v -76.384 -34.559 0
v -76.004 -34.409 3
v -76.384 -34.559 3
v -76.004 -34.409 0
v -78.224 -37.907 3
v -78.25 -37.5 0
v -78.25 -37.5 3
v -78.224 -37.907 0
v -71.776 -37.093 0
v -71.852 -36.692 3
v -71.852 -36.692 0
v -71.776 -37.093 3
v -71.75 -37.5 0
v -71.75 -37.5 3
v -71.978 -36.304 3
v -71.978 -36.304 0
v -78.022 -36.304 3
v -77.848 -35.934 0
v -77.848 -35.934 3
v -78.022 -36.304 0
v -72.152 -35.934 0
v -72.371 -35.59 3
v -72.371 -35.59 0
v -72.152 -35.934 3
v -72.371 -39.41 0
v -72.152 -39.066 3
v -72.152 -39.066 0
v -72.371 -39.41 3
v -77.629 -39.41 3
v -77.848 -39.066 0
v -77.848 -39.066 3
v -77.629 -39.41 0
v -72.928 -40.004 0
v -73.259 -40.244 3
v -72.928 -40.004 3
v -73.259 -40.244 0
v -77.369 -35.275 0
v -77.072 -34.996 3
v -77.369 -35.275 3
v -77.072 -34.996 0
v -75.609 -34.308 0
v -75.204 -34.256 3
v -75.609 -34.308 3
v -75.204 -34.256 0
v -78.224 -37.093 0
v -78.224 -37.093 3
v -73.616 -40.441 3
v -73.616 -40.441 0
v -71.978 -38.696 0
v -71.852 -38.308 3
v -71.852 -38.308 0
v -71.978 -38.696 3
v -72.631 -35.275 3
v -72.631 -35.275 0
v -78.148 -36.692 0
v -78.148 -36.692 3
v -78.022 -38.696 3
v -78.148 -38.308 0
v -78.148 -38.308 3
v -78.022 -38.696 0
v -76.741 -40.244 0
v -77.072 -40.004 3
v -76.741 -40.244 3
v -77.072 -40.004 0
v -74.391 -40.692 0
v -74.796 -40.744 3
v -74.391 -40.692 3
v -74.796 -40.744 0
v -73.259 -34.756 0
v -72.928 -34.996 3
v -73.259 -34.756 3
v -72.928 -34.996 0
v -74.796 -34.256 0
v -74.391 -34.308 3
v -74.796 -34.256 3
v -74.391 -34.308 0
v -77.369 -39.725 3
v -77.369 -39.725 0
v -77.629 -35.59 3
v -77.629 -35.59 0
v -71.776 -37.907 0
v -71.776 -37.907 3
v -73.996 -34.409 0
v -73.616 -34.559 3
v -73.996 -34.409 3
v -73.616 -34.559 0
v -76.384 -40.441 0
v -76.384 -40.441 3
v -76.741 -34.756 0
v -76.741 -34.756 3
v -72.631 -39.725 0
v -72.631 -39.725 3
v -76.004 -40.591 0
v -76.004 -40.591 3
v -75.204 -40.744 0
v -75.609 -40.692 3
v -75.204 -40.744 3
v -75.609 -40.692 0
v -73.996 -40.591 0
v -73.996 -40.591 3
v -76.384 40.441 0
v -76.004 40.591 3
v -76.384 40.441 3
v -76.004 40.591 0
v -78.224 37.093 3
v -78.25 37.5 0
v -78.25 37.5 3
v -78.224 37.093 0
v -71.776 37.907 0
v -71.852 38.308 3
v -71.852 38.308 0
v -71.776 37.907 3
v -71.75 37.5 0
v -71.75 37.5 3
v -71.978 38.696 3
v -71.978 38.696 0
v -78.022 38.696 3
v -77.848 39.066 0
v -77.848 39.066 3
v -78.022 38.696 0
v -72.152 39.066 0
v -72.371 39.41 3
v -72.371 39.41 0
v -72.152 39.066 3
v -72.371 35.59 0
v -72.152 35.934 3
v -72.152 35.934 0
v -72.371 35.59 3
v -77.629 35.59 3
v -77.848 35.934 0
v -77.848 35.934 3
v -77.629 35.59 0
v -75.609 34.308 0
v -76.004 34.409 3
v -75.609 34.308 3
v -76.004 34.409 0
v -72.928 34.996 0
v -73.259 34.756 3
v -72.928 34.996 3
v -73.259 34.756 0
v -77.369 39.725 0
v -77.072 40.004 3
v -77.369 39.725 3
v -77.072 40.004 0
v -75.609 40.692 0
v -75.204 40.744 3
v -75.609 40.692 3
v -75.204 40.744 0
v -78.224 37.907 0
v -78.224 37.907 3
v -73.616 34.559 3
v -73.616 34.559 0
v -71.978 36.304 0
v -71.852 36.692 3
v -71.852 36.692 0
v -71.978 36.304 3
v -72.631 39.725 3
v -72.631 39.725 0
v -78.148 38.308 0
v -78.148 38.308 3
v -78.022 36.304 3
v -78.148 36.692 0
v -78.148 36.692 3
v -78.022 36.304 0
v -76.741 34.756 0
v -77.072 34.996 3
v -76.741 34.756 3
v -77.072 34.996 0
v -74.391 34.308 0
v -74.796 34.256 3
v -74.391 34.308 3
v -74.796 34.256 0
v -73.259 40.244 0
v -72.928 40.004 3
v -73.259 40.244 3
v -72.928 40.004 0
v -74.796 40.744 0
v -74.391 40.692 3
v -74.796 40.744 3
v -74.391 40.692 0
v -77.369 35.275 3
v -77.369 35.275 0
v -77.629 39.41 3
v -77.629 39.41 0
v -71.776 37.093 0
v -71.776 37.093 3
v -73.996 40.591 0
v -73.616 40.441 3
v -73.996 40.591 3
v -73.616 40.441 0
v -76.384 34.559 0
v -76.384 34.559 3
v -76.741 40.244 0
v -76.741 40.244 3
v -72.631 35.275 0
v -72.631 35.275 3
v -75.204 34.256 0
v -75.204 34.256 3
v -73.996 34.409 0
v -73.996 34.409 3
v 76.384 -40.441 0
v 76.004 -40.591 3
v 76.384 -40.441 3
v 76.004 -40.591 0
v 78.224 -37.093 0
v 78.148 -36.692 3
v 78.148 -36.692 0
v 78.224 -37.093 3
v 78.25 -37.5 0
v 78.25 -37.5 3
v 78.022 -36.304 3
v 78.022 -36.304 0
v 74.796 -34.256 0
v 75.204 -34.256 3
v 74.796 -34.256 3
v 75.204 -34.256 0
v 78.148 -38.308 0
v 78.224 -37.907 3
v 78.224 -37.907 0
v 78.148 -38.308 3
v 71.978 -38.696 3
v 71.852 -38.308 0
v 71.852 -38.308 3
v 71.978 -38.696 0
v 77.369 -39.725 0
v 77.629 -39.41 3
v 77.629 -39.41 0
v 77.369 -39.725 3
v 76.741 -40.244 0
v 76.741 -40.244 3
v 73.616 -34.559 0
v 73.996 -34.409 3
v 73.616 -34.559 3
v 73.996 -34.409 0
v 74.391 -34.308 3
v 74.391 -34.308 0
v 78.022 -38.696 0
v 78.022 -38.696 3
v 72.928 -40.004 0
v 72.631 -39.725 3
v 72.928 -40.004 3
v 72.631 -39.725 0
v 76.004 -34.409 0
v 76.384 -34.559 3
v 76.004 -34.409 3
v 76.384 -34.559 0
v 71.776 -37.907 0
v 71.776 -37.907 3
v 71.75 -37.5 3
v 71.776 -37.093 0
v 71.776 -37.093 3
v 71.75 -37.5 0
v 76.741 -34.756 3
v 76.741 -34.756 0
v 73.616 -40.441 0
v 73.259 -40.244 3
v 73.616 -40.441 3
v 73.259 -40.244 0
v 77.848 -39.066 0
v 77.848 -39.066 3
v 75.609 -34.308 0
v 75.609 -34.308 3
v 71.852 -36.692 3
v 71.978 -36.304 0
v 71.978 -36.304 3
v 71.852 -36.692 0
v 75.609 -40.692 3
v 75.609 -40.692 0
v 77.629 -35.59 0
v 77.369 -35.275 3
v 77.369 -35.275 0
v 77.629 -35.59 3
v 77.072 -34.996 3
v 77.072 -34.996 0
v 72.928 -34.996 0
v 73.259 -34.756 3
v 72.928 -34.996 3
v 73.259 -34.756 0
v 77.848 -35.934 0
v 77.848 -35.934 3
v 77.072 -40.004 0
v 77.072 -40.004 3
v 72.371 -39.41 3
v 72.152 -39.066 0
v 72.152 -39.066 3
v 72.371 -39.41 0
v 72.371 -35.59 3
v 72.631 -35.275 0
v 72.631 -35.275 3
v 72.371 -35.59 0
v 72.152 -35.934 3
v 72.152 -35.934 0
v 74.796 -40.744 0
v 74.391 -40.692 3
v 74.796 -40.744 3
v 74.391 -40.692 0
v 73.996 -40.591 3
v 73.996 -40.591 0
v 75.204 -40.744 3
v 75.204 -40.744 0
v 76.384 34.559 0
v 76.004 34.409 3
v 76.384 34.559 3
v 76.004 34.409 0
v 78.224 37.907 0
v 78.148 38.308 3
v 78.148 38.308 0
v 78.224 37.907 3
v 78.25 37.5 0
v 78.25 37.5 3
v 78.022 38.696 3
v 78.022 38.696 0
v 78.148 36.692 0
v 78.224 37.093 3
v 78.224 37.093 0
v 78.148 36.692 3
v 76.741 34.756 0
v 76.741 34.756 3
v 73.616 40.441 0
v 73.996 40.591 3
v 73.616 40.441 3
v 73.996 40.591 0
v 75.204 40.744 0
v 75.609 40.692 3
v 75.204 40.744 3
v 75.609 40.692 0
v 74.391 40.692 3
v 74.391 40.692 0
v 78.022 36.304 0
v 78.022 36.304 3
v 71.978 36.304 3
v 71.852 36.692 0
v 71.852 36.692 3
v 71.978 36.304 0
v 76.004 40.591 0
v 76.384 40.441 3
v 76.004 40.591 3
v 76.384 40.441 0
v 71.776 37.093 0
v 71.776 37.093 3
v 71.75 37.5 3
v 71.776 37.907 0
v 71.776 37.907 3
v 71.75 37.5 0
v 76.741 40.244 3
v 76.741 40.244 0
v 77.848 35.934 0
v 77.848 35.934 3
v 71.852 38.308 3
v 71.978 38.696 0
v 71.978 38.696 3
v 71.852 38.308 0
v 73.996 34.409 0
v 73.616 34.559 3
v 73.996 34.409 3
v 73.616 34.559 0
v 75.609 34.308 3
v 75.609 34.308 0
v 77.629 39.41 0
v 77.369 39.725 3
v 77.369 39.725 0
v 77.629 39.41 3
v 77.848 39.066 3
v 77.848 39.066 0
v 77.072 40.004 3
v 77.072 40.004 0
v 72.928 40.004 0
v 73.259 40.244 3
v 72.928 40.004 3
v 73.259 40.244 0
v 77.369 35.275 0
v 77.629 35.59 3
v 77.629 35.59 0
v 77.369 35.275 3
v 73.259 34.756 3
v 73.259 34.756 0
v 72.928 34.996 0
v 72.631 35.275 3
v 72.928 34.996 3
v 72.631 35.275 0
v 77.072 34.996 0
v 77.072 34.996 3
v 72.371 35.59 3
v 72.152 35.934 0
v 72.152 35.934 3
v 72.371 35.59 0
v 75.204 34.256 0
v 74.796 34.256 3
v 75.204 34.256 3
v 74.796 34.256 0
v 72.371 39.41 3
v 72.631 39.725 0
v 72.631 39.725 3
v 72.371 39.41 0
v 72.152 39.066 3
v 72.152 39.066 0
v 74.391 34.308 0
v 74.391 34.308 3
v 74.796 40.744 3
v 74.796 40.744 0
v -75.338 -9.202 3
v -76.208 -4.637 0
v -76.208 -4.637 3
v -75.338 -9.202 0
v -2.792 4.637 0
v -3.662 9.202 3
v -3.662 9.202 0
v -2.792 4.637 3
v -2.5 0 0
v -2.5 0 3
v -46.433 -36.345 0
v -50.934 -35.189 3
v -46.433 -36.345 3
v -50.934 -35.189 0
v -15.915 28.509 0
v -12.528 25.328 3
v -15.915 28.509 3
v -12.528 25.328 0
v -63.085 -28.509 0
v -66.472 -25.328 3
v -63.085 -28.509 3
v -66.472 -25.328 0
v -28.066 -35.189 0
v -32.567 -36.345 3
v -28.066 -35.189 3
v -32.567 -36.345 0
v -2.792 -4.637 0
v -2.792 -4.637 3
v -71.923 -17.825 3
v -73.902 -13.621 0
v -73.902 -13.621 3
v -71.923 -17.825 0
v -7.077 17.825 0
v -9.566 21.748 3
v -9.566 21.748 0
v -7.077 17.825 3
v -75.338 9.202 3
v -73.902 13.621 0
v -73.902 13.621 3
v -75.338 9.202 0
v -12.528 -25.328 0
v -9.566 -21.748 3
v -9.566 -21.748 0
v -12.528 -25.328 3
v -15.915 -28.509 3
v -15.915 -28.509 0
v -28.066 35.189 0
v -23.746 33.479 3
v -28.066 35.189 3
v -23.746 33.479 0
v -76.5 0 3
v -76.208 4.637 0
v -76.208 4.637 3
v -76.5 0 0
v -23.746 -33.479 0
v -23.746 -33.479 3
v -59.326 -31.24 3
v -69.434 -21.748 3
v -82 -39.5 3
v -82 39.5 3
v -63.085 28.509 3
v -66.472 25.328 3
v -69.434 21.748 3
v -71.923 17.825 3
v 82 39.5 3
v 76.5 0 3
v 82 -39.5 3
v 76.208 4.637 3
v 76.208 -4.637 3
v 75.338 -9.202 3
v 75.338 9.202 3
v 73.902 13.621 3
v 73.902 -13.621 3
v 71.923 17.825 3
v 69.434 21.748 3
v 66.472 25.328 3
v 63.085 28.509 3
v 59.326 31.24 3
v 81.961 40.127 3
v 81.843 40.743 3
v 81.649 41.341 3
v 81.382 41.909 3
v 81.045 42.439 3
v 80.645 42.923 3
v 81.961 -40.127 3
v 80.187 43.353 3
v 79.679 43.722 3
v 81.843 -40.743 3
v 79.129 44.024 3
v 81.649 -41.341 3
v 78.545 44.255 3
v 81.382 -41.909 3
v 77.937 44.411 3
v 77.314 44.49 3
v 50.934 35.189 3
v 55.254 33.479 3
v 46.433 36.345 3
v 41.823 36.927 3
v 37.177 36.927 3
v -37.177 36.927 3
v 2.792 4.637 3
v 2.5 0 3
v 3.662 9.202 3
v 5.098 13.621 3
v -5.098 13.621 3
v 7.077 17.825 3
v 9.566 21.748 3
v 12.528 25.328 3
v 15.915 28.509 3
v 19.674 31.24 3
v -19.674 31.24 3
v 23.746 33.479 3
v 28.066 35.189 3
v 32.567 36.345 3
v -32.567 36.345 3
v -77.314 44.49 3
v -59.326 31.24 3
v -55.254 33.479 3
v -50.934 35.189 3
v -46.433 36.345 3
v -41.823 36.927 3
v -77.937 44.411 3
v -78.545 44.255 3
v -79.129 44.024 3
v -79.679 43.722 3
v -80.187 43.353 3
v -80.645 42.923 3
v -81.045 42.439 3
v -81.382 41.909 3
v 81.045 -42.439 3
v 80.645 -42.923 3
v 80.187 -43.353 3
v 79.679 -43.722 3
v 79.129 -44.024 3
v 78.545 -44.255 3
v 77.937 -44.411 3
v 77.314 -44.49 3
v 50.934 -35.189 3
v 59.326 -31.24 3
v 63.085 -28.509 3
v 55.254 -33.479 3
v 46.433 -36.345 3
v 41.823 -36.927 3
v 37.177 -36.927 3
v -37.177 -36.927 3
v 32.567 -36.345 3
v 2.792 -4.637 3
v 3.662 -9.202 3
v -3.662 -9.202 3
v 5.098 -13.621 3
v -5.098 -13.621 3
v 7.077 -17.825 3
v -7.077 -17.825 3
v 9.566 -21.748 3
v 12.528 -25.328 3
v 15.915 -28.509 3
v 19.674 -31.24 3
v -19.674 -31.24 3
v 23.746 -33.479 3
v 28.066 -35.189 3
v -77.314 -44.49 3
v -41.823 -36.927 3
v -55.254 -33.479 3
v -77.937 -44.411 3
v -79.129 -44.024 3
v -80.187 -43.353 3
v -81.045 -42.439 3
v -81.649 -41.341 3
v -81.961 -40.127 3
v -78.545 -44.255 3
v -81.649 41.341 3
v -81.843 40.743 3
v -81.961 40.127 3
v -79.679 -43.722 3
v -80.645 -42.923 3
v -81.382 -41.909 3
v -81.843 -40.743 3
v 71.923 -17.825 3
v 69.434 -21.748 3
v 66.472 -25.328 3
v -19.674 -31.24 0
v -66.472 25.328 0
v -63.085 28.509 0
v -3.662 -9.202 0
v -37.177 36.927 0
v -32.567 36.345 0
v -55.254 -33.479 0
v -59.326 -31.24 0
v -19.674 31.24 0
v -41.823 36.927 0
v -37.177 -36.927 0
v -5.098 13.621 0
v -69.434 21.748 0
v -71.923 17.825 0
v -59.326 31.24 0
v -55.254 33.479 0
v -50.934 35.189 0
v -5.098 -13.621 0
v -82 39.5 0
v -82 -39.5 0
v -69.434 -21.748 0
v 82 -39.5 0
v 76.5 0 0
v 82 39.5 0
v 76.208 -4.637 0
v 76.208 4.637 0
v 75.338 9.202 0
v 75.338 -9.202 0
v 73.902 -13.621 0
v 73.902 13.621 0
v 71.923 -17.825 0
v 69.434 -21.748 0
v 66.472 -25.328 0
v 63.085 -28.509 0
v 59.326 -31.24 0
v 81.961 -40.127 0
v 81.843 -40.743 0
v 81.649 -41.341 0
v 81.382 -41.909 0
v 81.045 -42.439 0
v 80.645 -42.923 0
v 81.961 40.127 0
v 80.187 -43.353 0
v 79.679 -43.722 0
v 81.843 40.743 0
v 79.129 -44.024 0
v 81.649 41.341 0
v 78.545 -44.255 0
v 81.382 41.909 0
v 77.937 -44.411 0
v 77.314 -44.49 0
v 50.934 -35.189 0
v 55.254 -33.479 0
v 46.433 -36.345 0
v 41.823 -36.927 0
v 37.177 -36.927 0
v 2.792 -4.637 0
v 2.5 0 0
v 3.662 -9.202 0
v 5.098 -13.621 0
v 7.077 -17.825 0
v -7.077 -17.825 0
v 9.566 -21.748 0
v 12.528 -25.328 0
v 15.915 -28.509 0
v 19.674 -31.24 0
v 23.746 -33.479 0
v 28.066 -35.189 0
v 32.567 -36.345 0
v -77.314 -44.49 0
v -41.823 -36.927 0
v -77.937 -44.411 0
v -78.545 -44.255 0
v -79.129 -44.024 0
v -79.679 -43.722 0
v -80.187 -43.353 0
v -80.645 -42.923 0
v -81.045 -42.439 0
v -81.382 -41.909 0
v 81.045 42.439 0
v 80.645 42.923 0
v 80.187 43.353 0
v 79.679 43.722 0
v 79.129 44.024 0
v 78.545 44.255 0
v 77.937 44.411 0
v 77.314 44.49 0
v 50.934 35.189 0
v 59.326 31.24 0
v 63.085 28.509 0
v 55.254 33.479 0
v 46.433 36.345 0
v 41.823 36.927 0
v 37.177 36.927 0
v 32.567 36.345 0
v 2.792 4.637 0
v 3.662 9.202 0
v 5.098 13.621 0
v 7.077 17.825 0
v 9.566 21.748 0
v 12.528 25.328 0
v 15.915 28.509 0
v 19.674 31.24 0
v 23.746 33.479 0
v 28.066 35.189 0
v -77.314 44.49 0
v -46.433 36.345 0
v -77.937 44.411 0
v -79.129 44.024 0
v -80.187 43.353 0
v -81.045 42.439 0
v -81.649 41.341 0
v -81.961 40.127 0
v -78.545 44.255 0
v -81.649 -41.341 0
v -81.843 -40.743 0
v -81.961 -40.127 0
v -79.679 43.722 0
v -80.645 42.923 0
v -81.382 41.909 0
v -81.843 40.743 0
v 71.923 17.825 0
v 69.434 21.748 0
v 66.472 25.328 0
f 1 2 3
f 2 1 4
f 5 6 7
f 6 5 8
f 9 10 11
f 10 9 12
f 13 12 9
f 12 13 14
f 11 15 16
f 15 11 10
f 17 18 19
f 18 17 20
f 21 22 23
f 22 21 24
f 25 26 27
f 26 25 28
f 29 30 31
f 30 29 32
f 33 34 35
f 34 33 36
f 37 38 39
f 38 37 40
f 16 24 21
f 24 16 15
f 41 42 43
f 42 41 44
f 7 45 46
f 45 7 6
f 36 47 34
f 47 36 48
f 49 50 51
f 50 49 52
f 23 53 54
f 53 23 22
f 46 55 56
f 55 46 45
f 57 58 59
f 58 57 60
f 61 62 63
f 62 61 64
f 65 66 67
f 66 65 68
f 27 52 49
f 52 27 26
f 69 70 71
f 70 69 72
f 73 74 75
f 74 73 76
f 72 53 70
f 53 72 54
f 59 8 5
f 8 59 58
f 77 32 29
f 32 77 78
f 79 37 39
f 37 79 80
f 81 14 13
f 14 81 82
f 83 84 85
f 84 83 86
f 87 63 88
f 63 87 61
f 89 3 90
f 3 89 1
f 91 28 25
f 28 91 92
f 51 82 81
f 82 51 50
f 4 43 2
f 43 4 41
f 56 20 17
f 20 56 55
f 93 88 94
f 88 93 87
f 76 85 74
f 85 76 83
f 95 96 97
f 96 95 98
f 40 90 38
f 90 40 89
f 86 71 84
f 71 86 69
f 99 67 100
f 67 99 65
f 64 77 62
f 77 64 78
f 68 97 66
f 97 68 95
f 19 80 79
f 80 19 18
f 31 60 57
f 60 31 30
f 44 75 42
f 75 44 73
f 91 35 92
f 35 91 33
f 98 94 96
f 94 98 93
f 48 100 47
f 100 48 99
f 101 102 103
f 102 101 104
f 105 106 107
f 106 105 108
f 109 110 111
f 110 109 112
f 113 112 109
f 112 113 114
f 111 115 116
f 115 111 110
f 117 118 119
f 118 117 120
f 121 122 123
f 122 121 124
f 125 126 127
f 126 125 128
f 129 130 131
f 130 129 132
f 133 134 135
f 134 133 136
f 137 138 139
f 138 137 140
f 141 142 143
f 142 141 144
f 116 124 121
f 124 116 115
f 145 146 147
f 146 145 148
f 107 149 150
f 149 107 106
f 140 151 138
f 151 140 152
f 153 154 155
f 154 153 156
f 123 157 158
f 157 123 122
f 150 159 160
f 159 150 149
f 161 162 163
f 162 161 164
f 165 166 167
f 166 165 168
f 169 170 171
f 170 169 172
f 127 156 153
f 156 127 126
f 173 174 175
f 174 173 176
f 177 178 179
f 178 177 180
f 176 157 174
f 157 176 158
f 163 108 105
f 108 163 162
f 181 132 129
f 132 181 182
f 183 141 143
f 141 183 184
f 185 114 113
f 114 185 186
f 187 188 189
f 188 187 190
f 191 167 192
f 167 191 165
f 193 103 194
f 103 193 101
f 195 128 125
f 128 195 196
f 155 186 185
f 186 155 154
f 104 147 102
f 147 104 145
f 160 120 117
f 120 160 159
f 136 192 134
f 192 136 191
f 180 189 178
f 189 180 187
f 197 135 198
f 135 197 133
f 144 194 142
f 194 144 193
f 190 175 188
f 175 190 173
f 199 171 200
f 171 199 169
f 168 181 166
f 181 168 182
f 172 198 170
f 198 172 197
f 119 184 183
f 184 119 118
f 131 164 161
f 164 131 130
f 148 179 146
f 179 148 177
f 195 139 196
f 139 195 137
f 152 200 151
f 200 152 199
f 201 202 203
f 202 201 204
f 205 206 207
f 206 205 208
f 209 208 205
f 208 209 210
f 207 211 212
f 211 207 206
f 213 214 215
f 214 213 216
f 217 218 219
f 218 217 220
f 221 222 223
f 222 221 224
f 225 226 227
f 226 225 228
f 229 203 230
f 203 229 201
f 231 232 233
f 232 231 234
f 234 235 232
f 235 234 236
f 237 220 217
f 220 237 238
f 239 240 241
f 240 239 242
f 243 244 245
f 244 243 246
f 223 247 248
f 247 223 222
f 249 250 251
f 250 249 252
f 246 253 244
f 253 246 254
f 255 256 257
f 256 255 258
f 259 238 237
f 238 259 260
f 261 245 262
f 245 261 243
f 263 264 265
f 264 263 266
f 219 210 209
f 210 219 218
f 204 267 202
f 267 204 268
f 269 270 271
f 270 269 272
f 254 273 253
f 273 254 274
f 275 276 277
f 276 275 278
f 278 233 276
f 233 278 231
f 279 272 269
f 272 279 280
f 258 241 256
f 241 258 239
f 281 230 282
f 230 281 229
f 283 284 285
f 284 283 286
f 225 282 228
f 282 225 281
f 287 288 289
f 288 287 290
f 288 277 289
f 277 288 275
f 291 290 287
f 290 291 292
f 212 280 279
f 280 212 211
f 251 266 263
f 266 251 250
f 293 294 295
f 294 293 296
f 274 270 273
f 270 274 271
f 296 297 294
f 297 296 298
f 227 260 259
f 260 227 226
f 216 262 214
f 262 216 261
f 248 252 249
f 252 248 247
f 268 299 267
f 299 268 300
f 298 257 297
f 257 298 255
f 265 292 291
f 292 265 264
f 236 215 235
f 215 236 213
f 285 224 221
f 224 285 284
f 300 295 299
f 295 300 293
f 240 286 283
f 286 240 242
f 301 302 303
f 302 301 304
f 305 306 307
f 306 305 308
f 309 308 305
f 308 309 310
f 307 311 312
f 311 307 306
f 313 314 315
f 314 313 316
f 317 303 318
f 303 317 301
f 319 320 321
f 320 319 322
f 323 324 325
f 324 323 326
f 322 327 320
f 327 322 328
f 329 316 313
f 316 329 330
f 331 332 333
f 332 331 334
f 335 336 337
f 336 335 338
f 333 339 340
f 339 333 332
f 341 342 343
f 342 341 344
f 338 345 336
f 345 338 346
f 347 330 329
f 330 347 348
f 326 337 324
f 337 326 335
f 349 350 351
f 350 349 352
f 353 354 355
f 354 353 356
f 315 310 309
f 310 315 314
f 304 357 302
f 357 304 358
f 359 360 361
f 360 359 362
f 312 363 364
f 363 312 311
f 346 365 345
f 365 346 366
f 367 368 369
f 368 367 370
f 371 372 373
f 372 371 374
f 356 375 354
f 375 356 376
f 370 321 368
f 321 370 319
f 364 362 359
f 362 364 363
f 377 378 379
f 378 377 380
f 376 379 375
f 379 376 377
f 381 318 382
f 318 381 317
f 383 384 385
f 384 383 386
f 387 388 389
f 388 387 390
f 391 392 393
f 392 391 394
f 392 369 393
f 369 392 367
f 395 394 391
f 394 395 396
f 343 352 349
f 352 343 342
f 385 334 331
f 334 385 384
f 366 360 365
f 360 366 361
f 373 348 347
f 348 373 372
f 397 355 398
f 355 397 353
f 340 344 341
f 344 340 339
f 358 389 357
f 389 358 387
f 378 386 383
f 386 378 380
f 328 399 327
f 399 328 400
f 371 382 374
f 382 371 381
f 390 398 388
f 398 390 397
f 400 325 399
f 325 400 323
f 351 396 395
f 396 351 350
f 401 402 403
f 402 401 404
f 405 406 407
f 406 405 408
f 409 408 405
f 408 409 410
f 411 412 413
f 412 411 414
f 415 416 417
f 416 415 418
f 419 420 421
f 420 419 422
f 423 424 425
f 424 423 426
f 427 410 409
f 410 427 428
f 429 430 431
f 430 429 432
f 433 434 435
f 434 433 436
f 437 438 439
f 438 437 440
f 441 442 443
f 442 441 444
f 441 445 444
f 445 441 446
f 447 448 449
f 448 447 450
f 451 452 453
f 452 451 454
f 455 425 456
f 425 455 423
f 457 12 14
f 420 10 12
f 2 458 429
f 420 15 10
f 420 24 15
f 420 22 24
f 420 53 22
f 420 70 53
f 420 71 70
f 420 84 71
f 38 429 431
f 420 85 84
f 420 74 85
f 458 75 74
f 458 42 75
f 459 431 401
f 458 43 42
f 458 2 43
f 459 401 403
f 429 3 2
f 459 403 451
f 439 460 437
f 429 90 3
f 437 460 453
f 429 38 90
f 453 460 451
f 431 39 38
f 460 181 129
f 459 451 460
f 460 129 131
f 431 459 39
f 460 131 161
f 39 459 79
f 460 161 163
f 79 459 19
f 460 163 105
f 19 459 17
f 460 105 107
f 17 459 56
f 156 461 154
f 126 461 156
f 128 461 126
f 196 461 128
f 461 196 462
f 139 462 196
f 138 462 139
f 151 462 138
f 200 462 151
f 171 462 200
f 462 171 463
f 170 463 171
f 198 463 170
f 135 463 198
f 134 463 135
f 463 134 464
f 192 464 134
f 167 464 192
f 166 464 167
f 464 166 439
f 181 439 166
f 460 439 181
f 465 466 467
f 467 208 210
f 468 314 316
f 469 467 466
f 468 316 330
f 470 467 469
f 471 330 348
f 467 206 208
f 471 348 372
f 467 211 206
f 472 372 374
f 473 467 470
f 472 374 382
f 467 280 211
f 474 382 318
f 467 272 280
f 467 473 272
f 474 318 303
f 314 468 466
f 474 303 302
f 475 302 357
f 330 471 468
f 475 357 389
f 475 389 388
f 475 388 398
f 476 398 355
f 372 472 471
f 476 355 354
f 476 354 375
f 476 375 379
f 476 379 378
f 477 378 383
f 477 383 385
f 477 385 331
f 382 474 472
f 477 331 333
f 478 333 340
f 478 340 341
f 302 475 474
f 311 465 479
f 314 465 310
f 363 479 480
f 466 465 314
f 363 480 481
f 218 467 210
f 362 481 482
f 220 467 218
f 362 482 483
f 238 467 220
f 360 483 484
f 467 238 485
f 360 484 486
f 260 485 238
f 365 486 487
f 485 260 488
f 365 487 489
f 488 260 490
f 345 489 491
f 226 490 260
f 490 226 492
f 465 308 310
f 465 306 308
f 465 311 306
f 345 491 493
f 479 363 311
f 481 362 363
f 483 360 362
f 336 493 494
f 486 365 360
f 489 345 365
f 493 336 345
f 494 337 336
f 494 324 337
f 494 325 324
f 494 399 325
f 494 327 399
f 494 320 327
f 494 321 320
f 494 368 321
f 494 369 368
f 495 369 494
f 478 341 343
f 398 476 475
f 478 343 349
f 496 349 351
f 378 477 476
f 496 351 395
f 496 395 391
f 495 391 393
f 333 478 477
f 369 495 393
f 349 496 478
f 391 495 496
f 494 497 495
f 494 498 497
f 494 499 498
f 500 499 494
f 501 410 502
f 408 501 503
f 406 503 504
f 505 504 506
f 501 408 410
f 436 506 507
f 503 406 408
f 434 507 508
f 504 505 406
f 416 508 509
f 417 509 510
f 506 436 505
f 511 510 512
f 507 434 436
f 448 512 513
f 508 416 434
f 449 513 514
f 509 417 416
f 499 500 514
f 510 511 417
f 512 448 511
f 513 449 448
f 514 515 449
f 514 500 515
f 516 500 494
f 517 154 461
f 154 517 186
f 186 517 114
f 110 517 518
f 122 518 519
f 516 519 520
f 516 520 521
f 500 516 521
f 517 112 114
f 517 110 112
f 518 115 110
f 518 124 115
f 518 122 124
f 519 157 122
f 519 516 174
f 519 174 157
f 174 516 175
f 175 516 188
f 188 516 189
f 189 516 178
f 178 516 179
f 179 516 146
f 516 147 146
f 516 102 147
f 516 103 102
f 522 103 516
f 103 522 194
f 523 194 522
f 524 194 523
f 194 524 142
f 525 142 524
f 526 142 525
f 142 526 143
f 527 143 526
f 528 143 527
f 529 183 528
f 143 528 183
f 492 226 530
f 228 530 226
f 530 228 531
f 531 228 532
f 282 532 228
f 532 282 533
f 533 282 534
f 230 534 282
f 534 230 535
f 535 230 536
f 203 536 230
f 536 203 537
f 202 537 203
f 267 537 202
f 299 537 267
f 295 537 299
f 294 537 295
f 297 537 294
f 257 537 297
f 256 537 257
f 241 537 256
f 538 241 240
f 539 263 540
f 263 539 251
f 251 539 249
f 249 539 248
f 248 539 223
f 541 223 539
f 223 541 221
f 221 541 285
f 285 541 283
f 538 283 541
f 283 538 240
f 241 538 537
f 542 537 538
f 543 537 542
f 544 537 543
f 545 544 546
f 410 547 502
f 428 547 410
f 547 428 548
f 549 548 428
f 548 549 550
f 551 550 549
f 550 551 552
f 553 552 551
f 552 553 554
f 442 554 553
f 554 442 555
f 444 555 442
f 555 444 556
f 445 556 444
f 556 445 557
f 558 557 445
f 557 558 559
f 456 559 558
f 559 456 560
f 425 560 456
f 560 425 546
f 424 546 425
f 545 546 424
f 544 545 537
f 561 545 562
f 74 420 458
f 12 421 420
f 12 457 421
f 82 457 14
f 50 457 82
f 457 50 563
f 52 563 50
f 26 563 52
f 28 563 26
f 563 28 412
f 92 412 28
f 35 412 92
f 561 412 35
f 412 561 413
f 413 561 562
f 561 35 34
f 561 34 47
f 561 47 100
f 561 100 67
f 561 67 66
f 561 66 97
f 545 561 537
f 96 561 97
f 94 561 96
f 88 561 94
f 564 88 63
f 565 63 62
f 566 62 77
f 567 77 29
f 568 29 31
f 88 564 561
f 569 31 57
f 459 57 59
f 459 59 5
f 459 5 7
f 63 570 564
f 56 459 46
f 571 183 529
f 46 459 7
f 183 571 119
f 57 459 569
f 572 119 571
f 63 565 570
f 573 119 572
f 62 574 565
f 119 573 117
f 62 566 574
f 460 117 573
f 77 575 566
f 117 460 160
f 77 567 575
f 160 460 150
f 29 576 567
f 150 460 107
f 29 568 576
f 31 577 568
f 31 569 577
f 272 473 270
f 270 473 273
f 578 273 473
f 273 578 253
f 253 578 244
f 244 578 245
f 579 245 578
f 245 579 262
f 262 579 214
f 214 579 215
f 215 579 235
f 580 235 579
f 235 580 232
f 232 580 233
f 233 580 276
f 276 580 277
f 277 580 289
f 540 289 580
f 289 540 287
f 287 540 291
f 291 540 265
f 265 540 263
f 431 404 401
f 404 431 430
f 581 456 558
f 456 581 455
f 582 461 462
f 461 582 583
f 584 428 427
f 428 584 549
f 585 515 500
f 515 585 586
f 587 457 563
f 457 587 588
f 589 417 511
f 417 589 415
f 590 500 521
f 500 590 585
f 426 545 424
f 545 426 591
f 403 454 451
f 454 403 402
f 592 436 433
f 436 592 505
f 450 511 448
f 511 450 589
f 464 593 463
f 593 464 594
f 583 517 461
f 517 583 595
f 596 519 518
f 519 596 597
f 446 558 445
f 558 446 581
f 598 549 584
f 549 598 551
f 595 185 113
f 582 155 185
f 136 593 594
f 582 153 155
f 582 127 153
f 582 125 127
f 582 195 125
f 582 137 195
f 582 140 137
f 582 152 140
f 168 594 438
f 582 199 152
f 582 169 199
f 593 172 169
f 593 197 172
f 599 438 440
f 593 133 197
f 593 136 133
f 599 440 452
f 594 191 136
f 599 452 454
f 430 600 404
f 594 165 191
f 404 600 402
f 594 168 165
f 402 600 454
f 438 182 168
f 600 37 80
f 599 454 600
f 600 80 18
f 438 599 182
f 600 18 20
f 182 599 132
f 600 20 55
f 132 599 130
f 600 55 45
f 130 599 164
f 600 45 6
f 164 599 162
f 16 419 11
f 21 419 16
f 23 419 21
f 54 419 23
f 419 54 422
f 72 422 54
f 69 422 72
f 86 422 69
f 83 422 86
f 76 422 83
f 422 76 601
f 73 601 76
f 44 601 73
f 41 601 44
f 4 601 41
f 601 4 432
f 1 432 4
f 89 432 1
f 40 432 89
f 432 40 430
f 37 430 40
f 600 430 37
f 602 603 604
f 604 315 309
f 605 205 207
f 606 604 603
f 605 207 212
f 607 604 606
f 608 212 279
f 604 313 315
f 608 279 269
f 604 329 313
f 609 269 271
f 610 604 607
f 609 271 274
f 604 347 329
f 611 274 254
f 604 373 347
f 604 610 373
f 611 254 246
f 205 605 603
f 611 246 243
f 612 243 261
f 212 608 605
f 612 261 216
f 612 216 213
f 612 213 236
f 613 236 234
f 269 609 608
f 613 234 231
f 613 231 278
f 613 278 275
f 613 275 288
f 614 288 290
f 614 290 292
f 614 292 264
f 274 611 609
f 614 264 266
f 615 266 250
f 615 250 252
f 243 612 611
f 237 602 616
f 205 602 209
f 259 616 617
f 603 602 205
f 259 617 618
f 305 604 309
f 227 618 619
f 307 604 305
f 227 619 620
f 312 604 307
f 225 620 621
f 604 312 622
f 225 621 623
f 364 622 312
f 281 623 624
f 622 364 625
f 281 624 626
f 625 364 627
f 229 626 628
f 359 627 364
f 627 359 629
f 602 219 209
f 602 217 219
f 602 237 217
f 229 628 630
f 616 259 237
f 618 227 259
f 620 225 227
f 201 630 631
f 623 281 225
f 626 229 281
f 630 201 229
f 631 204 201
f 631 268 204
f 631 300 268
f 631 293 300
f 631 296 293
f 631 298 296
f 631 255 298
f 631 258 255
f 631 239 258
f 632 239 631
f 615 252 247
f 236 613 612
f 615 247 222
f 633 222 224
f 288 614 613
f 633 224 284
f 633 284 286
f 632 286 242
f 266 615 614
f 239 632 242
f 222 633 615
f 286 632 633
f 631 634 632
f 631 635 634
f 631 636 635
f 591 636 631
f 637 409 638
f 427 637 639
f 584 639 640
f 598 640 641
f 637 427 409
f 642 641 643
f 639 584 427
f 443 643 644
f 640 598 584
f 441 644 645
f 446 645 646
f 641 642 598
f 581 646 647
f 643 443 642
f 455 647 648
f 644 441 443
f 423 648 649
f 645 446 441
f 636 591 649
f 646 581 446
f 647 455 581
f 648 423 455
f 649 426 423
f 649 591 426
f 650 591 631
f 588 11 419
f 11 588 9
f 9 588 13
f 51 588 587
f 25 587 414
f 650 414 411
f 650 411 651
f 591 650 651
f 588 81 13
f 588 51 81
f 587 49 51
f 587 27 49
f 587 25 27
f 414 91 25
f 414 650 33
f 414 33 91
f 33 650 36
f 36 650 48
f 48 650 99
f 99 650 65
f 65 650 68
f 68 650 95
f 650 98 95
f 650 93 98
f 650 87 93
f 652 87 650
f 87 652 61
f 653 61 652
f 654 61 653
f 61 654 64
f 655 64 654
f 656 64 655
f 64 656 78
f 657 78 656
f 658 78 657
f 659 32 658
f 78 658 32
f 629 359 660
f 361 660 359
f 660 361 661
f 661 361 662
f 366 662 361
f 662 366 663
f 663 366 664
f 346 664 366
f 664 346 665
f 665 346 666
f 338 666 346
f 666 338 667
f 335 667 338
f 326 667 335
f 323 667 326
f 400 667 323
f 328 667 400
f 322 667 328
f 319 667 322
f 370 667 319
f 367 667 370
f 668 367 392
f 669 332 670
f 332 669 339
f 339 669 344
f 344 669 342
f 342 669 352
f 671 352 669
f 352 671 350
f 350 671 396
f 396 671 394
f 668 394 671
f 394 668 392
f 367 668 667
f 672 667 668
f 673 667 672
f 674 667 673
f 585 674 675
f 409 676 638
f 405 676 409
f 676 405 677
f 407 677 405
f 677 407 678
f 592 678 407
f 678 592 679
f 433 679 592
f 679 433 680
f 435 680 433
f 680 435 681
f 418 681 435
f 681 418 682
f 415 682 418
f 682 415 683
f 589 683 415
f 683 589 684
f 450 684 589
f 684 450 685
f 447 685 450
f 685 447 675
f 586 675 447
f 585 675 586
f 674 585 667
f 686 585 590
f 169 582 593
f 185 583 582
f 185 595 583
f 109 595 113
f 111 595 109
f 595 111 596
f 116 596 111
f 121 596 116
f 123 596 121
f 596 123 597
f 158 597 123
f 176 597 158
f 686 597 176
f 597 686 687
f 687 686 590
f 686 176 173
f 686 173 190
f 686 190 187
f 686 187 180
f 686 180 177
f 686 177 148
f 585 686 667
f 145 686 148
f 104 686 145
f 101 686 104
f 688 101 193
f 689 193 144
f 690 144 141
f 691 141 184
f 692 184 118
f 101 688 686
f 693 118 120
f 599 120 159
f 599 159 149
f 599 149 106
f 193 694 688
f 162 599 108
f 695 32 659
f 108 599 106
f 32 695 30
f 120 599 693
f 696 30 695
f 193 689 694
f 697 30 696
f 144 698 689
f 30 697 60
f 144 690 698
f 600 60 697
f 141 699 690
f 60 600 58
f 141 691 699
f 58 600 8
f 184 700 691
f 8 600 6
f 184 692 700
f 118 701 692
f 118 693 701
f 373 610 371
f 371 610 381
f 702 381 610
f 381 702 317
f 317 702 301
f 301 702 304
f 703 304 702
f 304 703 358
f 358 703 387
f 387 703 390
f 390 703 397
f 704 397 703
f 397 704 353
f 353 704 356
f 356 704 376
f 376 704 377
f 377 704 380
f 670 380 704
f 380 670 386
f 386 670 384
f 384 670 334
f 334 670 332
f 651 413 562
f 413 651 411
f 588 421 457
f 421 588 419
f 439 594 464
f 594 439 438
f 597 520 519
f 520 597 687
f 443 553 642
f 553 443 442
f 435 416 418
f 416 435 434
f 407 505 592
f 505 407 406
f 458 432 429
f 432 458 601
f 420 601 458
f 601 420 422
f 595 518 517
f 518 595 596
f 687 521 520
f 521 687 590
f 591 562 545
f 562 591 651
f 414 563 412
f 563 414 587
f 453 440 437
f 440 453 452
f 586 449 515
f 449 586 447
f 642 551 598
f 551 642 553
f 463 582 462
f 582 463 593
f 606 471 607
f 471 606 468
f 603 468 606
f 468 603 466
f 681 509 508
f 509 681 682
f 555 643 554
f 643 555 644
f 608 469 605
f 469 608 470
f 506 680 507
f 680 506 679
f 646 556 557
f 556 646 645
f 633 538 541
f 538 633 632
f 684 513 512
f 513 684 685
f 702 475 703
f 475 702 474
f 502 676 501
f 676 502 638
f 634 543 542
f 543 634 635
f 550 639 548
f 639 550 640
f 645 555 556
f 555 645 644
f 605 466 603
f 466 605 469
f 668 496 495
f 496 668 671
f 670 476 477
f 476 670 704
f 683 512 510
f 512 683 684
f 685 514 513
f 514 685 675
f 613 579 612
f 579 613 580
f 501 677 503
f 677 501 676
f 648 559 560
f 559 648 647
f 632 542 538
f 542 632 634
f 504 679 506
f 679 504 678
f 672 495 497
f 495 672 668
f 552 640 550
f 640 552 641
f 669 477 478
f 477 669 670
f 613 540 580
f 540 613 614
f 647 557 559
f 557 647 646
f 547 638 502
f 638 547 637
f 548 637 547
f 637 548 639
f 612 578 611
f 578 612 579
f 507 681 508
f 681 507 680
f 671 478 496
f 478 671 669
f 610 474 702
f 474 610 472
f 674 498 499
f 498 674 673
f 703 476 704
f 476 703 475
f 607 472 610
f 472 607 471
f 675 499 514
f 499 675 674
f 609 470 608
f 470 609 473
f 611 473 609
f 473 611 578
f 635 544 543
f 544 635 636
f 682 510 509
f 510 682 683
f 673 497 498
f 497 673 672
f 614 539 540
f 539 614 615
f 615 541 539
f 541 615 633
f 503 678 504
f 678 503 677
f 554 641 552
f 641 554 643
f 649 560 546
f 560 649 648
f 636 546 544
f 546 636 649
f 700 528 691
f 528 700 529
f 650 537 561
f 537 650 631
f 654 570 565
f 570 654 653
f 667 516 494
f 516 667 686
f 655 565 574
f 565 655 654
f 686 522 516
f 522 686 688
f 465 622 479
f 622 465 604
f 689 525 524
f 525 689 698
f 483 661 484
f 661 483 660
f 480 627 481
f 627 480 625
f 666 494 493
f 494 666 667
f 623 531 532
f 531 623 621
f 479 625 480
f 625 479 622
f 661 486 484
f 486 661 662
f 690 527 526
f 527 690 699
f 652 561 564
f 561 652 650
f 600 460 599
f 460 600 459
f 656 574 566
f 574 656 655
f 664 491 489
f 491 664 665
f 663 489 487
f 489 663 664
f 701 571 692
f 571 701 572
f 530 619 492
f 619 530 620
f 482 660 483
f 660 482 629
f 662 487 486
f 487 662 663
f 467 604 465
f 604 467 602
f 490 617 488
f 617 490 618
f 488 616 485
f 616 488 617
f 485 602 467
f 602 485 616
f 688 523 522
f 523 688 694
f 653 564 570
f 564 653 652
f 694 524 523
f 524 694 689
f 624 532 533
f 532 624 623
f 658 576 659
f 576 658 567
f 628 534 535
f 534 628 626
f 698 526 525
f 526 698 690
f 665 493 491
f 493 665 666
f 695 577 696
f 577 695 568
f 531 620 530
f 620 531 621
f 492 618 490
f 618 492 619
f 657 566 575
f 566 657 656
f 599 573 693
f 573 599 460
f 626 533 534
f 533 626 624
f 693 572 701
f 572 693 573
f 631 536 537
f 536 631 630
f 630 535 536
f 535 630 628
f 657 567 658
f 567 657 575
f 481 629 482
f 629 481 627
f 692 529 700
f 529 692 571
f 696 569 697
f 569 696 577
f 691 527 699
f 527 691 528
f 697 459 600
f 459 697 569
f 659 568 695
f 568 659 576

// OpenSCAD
$fn = 50;


difference() {
	union() {
		hull() {
			translate(v = [-77.0000000000, 39.5000000000, 0]) {
				cylinder(h = 3, r = 5);
			}
			translate(v = [77.0000000000, 39.5000000000, 0]) {
				cylinder(h = 3, r = 5);
			}
			translate(v = [-77.0000000000, -39.5000000000, 0]) {
				cylinder(h = 3, r = 5);
			}
			translate(v = [77.0000000000, -39.5000000000, 0]) {
				cylinder(h = 3, r = 5);
			}
		}
	}
	union() {
		#translate(v = [-75.0000000000, -37.5000000000, -100.0000000000]) {
			cylinder(h = 200, r = 3.2500000000);
		}
		#translate(v = [-75.0000000000, 37.5000000000, -100.0000000000]) {
			cylinder(h = 200, r = 3.2500000000);
		}
		#translate(v = [75.0000000000, -37.5000000000, -100.0000000000]) {
			cylinder(h = 200, r = 3.2500000000);
		}
		#translate(v = [75.0000000000, 37.5000000000, -100.0000000000]) {
			cylinder(h = 200, r = 3.2500000000);
		}
		#translate(v = [-39.5000000000, 0, 0]) {
			cylinder(h = 3, r = 37.0000000000);
		}
		#translate(v = [39.5000000000, 0, 0]) {
			cylinder(h = 3, r = 37.0000000000);
		}
	}
}
